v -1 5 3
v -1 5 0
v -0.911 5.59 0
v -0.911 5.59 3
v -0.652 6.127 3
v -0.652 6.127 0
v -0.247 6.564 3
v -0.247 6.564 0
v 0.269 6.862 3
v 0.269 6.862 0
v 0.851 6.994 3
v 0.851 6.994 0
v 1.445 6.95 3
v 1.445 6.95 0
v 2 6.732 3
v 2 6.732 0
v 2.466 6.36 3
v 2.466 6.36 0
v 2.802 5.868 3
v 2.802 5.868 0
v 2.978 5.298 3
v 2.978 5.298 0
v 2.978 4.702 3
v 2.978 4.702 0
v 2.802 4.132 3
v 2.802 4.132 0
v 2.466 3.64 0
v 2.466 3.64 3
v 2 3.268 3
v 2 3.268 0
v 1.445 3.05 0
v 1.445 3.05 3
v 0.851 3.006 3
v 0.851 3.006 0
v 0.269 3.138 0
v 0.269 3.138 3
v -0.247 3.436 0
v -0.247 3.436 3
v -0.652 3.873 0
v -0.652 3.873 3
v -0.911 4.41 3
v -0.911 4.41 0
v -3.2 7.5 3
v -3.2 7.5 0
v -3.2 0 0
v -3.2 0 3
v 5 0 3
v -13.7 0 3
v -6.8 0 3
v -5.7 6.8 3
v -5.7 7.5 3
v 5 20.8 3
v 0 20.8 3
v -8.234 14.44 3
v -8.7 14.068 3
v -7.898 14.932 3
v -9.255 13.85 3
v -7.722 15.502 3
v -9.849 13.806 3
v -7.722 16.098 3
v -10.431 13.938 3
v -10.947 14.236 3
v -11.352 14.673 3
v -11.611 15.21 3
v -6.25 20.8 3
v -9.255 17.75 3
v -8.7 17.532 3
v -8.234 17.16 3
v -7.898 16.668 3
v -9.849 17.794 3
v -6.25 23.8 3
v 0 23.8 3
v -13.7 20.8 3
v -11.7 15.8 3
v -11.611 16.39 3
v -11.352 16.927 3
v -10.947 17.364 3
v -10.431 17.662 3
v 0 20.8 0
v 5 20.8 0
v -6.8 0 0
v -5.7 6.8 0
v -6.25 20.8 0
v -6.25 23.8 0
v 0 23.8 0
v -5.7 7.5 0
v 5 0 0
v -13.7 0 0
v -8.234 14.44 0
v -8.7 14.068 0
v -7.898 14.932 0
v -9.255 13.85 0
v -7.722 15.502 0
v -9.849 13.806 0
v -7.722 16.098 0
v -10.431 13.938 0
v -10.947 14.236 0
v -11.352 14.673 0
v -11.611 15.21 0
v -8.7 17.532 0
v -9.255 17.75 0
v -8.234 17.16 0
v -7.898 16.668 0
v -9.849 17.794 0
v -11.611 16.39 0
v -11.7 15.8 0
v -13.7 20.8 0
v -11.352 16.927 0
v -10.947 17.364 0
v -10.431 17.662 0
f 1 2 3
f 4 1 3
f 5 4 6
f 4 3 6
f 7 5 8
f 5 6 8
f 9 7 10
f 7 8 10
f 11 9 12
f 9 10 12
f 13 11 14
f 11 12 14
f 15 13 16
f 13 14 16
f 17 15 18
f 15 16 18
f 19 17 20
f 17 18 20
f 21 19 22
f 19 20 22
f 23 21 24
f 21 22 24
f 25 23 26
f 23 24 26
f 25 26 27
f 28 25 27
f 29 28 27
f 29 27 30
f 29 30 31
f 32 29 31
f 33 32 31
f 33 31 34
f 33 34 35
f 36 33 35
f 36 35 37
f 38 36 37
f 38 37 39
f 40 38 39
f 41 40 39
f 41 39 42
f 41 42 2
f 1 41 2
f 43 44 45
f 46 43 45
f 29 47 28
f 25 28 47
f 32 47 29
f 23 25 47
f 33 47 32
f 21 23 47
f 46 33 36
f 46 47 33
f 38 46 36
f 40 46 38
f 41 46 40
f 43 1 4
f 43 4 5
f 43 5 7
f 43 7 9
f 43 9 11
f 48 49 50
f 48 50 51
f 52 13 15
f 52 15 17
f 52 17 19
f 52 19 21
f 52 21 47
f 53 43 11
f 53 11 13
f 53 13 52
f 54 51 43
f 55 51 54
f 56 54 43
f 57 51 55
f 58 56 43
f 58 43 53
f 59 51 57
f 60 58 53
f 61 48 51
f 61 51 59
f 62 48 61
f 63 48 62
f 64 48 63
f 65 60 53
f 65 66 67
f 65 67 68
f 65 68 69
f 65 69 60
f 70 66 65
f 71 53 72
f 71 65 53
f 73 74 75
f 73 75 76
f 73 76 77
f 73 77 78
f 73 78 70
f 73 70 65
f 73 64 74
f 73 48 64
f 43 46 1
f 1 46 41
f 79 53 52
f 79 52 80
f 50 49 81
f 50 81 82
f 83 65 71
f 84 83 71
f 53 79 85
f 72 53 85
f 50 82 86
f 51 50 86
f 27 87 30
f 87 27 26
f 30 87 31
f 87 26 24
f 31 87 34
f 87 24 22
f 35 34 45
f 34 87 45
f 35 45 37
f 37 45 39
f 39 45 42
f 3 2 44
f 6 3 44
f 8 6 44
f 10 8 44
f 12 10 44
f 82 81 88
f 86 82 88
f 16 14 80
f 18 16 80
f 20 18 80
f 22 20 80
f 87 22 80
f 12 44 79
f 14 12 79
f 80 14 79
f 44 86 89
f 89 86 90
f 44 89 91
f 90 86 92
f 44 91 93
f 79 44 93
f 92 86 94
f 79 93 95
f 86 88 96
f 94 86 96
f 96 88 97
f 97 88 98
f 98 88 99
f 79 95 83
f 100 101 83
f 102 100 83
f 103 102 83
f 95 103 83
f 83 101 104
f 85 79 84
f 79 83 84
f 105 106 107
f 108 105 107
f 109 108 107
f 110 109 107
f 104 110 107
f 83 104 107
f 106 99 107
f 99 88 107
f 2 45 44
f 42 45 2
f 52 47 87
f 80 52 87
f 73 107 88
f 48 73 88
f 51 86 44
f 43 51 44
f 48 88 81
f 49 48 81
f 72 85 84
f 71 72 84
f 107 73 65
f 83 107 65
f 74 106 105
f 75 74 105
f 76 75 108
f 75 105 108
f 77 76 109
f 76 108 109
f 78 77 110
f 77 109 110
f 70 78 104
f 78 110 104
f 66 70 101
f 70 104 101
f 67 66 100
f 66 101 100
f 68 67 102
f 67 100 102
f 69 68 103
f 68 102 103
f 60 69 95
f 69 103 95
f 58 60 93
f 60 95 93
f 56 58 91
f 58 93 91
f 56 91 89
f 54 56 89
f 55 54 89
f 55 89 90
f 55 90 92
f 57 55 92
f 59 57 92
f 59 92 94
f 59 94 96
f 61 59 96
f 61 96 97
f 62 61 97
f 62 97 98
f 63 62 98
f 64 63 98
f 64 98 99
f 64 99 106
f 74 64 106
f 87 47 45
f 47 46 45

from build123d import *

# Parameters (mm, degrees)
BOSS_EXTRUDE1_DEPTH          = 3
SKETCH2_W                    = 7.45
SKETCH2_H                    = 3
CUT_EXTRUDE1_DEPTH           = 3
SKETCH3_W                    = 3
SKETCH3_H                    = 20.8
BOSS_EXTRUDE2_DEPTH          = 5
CUT_EXTRUDE2_REACH           = 5
F_4_0_4_DIAMETER_HOLE1_D     = 4
F_4_0_4_DIAMETER_HOLE1_DEPTH = 3


with BuildPart() as part:
    # Sketch1 → Boss-Extrude1 (new body)
    with BuildSketch(Plane.XY):
        Polygon((-13.7, 0), (-5.7, 0), (-5.7, 7.5), (-3.2, 7.5), (-3.2, 0), (0, 0), (0, 23.8), (-13.7, 23.8), align=None)
    extrude(amount=BOSS_EXTRUDE1_DEPTH)

    # Sketch2 → Cut-Extrude1 (cut)
    with BuildSketch(Plane.XY.offset(3)):
        with Locations((-9.975, 22.3)):
            Rectangle(SKETCH2_W, SKETCH2_H)
    extrude(amount=-CUT_EXTRUDE1_DEPTH, mode=Mode.SUBTRACT)

    # Sketch3 → Boss-Extrude2 (add)
    with BuildSketch(Plane(origin=(0, 0, 0), x_dir=(0, 0, -1), z_dir=(1, 0, 0))):
        with Locations((-1.5, 10.4)):
            Rectangle(SKETCH3_W, SKETCH3_H)
    extrude(amount=BOSS_EXTRUDE2_DEPTH)

    # Sketch4 → Cut-Extrude2 (cut, up to next)
    with BuildSketch(Plane.XY.offset(3), mode=Mode.PRIVATE) as cut_extrude2_sk1:
        Polygon((-5.7, 0), (-6.8, 0), (-5.7, 6.8), align=None)
    cut_extrude2_tool1 = extrude(cut_extrude2_sk1.sketch, amount=-CUT_EXTRUDE2_REACH, mode=Mode.PRIVATE) & part.part
    add(cut_extrude2_tool1.solids().sort_by_distance((-6.066667, 2.266667, 3))[0], mode=Mode.SUBTRACT)

    # Ø4.0 (4) Diameter Hole1
    with Locations(Plane.XY.offset(3)):
        with Locations((-9.7, 15.8), (1, 5)):
            Hole(F_4_0_4_DIAMETER_HOLE1_D / 2, depth=F_4_0_4_DIAMETER_HOLE1_DEPTH)


solid = part.part
